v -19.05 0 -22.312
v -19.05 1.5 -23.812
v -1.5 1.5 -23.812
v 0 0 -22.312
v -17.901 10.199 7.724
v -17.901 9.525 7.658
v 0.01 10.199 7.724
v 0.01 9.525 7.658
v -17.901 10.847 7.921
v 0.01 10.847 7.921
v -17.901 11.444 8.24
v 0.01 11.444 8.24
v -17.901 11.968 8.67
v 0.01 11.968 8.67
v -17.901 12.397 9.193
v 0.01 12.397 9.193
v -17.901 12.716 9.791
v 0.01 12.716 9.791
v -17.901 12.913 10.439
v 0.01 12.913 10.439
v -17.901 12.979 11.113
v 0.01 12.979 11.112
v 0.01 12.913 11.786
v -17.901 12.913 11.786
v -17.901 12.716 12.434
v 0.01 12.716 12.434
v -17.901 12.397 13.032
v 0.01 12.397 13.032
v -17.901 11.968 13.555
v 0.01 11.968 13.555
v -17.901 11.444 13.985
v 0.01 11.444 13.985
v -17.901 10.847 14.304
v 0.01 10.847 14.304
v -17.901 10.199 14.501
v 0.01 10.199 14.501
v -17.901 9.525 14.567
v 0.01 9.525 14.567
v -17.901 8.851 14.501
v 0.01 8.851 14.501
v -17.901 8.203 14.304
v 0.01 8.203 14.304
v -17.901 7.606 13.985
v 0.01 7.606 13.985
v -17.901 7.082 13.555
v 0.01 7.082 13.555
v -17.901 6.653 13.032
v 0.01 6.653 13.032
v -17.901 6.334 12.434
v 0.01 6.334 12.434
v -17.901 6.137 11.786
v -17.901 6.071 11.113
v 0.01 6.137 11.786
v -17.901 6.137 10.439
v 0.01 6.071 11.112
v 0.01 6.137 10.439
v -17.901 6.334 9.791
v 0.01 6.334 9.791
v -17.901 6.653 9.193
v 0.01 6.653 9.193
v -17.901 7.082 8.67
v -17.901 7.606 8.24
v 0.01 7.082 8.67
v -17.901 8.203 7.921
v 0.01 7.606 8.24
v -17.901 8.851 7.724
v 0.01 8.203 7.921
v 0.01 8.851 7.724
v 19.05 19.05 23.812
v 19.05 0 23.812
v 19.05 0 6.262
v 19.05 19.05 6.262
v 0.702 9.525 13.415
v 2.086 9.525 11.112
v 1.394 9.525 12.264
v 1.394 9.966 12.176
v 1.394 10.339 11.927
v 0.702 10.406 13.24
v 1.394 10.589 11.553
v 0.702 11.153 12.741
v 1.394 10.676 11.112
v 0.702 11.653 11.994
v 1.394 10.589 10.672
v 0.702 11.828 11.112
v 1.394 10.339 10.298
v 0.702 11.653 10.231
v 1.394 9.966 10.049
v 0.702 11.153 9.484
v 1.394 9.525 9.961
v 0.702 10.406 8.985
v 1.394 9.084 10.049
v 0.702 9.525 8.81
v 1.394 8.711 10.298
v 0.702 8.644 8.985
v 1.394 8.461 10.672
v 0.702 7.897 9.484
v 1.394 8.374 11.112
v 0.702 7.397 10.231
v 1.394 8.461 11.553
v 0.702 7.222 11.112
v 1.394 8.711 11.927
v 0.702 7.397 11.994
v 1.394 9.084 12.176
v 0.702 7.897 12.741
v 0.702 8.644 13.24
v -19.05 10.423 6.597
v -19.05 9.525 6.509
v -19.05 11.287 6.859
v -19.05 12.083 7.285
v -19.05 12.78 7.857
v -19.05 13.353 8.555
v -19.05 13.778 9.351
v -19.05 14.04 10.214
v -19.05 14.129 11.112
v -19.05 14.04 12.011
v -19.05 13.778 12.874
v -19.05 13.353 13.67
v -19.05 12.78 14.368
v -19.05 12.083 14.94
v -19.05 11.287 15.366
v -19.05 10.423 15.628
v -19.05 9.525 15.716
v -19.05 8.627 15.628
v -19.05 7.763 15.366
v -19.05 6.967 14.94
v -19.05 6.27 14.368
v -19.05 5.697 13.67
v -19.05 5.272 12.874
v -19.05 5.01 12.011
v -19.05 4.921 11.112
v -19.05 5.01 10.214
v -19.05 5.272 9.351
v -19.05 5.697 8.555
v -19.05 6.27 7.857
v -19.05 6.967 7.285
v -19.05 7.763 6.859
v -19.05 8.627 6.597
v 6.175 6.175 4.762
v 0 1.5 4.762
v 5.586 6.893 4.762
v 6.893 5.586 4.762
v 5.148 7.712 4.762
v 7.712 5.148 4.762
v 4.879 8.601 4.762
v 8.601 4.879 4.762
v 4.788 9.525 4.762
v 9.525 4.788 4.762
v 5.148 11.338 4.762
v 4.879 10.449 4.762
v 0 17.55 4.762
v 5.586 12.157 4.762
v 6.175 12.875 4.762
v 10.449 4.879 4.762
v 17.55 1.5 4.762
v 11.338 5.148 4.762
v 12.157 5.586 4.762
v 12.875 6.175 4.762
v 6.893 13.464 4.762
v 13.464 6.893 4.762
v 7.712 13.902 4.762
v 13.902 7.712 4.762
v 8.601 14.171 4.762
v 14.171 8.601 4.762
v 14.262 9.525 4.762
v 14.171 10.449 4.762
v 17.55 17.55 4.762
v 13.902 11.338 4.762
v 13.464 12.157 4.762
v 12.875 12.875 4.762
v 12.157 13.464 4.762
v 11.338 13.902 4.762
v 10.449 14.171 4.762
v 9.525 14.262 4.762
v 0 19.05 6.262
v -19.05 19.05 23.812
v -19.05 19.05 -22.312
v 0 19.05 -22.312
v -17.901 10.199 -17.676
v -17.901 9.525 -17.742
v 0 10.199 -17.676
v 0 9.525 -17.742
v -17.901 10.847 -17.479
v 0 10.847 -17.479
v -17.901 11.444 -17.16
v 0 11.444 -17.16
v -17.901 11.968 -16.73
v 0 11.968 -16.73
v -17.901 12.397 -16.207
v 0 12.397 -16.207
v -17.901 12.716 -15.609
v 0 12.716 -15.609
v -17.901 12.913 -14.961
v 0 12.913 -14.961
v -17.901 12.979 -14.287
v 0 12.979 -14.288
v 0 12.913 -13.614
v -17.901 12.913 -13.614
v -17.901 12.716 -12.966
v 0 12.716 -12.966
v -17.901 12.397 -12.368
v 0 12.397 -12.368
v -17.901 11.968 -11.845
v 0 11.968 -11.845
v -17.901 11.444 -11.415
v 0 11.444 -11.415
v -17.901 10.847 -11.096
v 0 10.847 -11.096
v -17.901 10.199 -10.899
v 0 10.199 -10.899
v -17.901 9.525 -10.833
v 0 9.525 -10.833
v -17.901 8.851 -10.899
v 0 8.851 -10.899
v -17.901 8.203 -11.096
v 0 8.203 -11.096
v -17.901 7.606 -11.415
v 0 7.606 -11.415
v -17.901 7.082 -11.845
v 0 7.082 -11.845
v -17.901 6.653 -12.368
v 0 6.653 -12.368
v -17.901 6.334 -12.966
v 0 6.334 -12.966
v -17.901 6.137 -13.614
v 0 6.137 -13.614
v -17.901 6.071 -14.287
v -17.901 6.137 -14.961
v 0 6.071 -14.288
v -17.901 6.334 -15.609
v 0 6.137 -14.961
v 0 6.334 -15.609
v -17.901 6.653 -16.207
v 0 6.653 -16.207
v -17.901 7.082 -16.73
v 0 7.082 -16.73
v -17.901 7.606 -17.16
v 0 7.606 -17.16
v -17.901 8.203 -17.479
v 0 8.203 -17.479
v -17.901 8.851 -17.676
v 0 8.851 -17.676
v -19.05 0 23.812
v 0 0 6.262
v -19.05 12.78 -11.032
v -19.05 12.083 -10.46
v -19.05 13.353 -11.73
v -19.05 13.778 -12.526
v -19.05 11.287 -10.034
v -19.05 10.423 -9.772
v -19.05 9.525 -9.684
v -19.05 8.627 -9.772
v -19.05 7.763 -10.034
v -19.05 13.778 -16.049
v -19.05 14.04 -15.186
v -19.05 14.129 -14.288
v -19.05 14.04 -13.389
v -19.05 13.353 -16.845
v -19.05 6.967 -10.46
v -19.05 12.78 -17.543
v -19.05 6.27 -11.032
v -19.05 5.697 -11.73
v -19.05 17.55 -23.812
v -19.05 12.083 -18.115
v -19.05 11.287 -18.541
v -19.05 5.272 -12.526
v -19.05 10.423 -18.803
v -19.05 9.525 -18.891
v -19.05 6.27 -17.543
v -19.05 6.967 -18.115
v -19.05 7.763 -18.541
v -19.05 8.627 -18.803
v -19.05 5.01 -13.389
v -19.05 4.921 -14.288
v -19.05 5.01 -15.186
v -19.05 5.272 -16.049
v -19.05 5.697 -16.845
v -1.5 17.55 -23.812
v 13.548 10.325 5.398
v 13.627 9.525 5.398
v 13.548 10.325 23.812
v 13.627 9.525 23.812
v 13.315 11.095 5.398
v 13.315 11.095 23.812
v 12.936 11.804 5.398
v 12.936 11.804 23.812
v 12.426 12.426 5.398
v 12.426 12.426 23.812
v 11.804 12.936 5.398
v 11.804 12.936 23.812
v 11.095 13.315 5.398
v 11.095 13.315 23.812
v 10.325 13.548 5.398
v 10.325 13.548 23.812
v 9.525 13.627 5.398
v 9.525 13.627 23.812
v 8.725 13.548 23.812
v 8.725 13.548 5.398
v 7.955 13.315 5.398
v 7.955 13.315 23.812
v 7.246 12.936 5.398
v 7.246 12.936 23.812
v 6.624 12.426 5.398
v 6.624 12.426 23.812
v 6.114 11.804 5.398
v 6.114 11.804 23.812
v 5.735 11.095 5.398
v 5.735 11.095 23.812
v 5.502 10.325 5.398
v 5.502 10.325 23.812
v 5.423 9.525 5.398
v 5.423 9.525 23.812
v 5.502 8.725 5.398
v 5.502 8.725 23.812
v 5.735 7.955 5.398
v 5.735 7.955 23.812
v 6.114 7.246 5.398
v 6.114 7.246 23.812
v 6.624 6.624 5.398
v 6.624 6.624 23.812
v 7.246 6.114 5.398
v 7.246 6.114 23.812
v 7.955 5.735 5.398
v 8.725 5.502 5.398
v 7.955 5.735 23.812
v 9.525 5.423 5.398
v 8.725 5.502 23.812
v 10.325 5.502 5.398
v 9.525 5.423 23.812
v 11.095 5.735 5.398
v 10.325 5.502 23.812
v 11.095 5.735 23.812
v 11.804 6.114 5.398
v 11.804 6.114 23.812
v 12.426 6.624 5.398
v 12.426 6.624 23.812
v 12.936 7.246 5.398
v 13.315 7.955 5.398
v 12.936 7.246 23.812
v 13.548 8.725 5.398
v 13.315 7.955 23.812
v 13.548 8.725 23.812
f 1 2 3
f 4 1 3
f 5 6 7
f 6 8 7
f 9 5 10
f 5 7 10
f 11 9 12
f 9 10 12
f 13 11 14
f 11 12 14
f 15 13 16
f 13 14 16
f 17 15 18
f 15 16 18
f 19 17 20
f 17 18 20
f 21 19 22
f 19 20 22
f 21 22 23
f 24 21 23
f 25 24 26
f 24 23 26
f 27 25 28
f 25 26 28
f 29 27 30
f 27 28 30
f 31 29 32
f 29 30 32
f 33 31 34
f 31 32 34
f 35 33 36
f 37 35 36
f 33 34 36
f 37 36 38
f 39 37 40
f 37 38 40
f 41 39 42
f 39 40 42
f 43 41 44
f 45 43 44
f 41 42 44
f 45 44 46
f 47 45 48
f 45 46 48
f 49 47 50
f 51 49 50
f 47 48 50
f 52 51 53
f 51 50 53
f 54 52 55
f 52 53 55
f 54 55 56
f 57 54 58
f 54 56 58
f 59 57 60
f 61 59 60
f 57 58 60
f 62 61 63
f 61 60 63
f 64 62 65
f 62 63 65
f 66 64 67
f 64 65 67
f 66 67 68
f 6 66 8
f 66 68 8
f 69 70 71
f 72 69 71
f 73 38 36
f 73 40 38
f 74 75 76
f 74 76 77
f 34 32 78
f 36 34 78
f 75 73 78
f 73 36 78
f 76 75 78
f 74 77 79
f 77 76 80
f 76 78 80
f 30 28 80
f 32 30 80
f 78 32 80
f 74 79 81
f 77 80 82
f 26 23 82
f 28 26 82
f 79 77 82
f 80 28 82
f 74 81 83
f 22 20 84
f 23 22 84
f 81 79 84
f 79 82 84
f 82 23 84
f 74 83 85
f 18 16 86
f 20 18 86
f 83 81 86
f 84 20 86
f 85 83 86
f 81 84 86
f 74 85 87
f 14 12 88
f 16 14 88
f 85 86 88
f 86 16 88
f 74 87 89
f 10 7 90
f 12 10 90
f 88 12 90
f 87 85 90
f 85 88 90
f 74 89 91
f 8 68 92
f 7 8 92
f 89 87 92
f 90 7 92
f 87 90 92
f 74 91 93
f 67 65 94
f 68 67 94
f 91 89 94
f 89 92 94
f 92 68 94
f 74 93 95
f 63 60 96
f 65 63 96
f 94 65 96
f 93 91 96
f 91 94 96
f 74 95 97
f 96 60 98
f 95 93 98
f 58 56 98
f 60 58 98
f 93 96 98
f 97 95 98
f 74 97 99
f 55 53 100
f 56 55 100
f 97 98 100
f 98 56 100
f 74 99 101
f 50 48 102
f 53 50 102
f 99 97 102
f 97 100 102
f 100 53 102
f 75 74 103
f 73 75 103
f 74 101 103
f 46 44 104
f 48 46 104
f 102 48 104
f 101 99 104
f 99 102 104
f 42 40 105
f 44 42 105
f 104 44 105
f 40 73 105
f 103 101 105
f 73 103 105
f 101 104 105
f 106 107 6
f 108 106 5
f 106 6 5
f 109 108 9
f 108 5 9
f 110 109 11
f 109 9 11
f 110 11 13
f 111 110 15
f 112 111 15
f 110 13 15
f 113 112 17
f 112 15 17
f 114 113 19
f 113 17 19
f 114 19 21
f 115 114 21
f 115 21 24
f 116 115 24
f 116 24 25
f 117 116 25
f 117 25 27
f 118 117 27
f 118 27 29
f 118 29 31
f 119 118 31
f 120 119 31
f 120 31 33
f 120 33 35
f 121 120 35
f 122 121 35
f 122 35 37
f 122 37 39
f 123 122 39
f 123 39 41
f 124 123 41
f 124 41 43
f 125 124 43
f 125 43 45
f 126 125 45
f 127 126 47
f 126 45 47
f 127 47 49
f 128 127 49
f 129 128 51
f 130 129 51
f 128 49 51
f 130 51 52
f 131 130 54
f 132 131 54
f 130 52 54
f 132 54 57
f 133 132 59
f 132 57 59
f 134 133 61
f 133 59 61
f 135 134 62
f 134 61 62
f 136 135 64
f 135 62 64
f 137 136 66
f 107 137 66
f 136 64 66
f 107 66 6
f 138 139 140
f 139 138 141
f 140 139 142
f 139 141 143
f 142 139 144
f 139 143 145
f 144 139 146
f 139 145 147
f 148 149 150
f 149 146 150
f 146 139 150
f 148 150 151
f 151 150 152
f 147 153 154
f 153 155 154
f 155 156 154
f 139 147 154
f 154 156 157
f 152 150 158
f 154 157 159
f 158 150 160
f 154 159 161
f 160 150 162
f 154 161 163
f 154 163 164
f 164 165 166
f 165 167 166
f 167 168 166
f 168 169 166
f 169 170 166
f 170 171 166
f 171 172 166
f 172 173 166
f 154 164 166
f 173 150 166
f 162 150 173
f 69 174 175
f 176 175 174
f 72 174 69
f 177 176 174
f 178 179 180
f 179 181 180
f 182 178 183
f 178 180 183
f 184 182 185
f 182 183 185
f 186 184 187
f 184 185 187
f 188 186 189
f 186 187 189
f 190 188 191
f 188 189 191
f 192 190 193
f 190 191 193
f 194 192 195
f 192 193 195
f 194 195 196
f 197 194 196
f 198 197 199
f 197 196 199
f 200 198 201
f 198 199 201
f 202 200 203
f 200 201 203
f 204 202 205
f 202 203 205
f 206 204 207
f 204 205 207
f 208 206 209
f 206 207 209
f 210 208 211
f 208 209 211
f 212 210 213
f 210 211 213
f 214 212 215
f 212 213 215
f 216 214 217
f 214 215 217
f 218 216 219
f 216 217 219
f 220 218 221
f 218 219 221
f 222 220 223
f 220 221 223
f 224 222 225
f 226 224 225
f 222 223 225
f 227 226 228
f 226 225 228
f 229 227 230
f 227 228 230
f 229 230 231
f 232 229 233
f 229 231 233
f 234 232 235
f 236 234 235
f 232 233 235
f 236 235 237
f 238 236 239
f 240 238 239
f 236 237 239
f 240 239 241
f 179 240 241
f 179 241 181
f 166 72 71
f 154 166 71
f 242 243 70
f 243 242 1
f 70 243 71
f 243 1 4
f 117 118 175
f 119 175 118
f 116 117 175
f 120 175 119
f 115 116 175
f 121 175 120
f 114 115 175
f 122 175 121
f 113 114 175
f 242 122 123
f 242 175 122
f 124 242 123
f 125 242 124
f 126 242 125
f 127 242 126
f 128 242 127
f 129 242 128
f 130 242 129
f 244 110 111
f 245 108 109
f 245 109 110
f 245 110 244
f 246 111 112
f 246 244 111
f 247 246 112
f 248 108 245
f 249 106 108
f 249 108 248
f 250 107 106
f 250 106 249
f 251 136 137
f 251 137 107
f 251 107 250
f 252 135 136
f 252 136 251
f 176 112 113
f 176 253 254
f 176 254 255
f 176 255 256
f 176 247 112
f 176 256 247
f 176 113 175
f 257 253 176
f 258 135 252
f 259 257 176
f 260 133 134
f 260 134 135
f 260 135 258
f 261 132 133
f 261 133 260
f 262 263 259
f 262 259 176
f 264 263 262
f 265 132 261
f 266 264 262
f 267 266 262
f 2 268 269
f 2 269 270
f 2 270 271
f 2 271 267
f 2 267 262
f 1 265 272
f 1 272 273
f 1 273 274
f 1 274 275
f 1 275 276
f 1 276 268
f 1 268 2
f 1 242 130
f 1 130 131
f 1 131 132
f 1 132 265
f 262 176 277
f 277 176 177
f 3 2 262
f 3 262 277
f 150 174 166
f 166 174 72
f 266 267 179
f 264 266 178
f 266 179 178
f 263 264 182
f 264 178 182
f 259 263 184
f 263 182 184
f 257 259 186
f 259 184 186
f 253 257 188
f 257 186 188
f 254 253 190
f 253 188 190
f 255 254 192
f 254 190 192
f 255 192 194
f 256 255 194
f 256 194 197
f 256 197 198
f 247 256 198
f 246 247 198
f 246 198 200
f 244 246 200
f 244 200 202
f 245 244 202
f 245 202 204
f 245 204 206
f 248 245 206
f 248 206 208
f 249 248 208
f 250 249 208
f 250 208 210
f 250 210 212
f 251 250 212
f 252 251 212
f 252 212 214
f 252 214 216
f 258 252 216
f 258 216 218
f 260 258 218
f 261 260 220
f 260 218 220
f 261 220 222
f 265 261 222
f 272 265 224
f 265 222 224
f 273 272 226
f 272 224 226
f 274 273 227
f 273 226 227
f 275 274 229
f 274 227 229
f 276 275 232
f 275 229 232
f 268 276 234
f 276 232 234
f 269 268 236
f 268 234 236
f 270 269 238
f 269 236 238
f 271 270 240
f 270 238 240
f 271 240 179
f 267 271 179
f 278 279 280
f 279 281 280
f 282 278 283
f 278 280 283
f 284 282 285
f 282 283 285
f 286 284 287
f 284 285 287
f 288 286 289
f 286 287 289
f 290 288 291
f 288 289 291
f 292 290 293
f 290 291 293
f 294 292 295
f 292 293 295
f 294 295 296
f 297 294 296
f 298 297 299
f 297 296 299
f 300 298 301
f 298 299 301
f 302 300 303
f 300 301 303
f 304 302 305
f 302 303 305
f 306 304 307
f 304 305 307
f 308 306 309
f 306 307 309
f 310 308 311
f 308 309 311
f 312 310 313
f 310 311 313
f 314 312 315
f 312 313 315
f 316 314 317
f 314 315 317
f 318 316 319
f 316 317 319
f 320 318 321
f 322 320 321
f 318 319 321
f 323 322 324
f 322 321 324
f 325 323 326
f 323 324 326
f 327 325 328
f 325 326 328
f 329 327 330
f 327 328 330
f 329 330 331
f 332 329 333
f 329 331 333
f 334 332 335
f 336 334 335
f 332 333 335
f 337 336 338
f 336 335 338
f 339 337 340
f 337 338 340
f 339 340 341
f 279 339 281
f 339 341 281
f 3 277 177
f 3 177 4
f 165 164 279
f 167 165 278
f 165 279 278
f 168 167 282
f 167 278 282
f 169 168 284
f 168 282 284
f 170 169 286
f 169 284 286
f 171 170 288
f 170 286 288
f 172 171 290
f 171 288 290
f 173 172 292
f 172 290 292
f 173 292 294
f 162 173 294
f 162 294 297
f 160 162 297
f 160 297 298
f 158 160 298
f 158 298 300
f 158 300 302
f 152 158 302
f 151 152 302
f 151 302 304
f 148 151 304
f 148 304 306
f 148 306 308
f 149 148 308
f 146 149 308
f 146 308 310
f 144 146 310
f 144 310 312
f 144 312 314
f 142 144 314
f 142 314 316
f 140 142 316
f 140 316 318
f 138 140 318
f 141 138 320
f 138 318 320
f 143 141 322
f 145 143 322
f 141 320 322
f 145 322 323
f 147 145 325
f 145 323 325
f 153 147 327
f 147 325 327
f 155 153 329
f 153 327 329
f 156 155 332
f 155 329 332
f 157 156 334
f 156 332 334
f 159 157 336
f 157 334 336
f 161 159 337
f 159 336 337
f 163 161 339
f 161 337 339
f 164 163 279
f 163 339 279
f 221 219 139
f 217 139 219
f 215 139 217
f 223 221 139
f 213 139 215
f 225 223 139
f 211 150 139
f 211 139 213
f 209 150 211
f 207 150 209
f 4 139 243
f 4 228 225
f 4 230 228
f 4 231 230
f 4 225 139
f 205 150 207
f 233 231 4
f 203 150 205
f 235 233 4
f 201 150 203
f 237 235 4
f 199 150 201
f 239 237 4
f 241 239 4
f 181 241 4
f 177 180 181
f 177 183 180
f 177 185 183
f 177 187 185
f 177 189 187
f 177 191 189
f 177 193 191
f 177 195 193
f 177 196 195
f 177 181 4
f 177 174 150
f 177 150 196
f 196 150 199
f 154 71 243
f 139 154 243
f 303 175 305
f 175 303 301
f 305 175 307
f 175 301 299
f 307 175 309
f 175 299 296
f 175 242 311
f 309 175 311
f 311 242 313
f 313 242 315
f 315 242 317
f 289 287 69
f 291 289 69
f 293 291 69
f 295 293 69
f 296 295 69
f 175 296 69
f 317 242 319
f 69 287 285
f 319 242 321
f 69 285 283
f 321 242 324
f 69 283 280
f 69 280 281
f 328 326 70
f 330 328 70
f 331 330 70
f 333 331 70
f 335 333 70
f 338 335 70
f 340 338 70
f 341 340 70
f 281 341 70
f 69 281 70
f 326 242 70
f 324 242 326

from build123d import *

# Parameters (mm, degrees)
SKETCH1_W                          = 38.1
SKETCH1_H                          = 47.625
BOSS_EXTRUDE1_DEPTH                = 19.05
CUT_EXTRUDE1_REACH                 = 21.05
SKETCH2_W                          = 19.05
SKETCH2_H                          = 28.575
F_5_16_24_TAPPED_HOLE1_D           = 6.9088
F_5_16_24_TAPPED_HOLE1_DEPTH       = 19.06
F_5_16_24_TAPPED_HOLE1_CSINK_D     = 9.2075
F_5_16_24_TAPPED_HOLE1_CSINK_ANGLE = 90
F_5_16_24_TAPPED_HOLE1_TIP         = 2.075612922
F_5_16_CLEARANCE_HOLE1_D           = 8.2042
F_5_16_CLEARANCE_HOLE1_CSINK_D     = 9.4742
F_5_16_CLEARANCE_HOLE1_CSINK_ANGLE = 90
CHAMFER1_SIZE                      = 1.5


with BuildPart() as part:
    # Sketch1 → Boss-Extrude1 (new body)
    with BuildSketch(Plane(origin=(0, 0, 0), x_dir=(1, 0, 0), z_dir=(0, 1, 0))):
        Rectangle(SKETCH1_W, SKETCH1_H)
    extrude(amount=BOSS_EXTRUDE1_DEPTH)

    # Sketch2 → Cut-Extrude1 (cut, up to next)
    with BuildSketch(Plane(origin=(0, 19.05, 0), x_dir=(1, 0, 0), z_dir=(0, 1, 0)), mode=Mode.PRIVATE) as cut_extrude1_sk1:
        with Locations((9.525, 9.525)):
            Rectangle(SKETCH2_W, SKETCH2_H)
    cut_extrude1_tool1 = extrude(cut_extrude1_sk1.sketch, amount=-CUT_EXTRUDE1_REACH, mode=Mode.PRIVATE) & part.part
    add(cut_extrude1_tool1.solids().sort_by_distance((9.525, 19.05, -9.525))[0], mode=Mode.SUBTRACT)

    # 5/16-24 Tapped Hole1
    with Locations(Plane.ZY.offset(19.05)):
        with Locations((-14.2875, 9.525), (11.1125, 9.525)):
            CounterSinkHole(F_5_16_24_TAPPED_HOLE1_D / 2, F_5_16_24_TAPPED_HOLE1_CSINK_D / 2, depth=F_5_16_24_TAPPED_HOLE1_DEPTH, counter_sink_angle=F_5_16_24_TAPPED_HOLE1_CSINK_ANGLE)
            with Locations((0, 0, -(F_5_16_24_TAPPED_HOLE1_DEPTH + F_5_16_24_TAPPED_HOLE1_TIP / 2))):  # 118° drill point
                Cone(0, F_5_16_24_TAPPED_HOLE1_D / 2, F_5_16_24_TAPPED_HOLE1_TIP, mode=Mode.SUBTRACT)

    # 5/16 Clearance Hole1 (through all)
    with Locations(Plane(origin=(0, 0, 4.7625), x_dir=(-1, 0, 0), z_dir=(0, 0, -1))):
        with Locations((-9.525, 9.525)):
            CounterSinkHole(F_5_16_CLEARANCE_HOLE1_D / 2, F_5_16_CLEARANCE_HOLE1_CSINK_D / 2, counter_sink_angle=F_5_16_CLEARANCE_HOLE1_CSINK_ANGLE)

    # Chamfer1
    chamfer1_edges = [part.edges().sort_by_distance(p)[0] for p in [
        (-9.525, 0, -23.8125),
        (-9.525, 19.05, -23.8125),
        (9.525, 0, 4.7625),
        (19.05, 9.525, 4.7625),
        (0, 9.525, -23.8125),
        (9.525, 19.05, 4.7625),
    ]]
    chamfer(chamfer1_edges, length=CHAMFER1_SIZE)


solid = part.part
